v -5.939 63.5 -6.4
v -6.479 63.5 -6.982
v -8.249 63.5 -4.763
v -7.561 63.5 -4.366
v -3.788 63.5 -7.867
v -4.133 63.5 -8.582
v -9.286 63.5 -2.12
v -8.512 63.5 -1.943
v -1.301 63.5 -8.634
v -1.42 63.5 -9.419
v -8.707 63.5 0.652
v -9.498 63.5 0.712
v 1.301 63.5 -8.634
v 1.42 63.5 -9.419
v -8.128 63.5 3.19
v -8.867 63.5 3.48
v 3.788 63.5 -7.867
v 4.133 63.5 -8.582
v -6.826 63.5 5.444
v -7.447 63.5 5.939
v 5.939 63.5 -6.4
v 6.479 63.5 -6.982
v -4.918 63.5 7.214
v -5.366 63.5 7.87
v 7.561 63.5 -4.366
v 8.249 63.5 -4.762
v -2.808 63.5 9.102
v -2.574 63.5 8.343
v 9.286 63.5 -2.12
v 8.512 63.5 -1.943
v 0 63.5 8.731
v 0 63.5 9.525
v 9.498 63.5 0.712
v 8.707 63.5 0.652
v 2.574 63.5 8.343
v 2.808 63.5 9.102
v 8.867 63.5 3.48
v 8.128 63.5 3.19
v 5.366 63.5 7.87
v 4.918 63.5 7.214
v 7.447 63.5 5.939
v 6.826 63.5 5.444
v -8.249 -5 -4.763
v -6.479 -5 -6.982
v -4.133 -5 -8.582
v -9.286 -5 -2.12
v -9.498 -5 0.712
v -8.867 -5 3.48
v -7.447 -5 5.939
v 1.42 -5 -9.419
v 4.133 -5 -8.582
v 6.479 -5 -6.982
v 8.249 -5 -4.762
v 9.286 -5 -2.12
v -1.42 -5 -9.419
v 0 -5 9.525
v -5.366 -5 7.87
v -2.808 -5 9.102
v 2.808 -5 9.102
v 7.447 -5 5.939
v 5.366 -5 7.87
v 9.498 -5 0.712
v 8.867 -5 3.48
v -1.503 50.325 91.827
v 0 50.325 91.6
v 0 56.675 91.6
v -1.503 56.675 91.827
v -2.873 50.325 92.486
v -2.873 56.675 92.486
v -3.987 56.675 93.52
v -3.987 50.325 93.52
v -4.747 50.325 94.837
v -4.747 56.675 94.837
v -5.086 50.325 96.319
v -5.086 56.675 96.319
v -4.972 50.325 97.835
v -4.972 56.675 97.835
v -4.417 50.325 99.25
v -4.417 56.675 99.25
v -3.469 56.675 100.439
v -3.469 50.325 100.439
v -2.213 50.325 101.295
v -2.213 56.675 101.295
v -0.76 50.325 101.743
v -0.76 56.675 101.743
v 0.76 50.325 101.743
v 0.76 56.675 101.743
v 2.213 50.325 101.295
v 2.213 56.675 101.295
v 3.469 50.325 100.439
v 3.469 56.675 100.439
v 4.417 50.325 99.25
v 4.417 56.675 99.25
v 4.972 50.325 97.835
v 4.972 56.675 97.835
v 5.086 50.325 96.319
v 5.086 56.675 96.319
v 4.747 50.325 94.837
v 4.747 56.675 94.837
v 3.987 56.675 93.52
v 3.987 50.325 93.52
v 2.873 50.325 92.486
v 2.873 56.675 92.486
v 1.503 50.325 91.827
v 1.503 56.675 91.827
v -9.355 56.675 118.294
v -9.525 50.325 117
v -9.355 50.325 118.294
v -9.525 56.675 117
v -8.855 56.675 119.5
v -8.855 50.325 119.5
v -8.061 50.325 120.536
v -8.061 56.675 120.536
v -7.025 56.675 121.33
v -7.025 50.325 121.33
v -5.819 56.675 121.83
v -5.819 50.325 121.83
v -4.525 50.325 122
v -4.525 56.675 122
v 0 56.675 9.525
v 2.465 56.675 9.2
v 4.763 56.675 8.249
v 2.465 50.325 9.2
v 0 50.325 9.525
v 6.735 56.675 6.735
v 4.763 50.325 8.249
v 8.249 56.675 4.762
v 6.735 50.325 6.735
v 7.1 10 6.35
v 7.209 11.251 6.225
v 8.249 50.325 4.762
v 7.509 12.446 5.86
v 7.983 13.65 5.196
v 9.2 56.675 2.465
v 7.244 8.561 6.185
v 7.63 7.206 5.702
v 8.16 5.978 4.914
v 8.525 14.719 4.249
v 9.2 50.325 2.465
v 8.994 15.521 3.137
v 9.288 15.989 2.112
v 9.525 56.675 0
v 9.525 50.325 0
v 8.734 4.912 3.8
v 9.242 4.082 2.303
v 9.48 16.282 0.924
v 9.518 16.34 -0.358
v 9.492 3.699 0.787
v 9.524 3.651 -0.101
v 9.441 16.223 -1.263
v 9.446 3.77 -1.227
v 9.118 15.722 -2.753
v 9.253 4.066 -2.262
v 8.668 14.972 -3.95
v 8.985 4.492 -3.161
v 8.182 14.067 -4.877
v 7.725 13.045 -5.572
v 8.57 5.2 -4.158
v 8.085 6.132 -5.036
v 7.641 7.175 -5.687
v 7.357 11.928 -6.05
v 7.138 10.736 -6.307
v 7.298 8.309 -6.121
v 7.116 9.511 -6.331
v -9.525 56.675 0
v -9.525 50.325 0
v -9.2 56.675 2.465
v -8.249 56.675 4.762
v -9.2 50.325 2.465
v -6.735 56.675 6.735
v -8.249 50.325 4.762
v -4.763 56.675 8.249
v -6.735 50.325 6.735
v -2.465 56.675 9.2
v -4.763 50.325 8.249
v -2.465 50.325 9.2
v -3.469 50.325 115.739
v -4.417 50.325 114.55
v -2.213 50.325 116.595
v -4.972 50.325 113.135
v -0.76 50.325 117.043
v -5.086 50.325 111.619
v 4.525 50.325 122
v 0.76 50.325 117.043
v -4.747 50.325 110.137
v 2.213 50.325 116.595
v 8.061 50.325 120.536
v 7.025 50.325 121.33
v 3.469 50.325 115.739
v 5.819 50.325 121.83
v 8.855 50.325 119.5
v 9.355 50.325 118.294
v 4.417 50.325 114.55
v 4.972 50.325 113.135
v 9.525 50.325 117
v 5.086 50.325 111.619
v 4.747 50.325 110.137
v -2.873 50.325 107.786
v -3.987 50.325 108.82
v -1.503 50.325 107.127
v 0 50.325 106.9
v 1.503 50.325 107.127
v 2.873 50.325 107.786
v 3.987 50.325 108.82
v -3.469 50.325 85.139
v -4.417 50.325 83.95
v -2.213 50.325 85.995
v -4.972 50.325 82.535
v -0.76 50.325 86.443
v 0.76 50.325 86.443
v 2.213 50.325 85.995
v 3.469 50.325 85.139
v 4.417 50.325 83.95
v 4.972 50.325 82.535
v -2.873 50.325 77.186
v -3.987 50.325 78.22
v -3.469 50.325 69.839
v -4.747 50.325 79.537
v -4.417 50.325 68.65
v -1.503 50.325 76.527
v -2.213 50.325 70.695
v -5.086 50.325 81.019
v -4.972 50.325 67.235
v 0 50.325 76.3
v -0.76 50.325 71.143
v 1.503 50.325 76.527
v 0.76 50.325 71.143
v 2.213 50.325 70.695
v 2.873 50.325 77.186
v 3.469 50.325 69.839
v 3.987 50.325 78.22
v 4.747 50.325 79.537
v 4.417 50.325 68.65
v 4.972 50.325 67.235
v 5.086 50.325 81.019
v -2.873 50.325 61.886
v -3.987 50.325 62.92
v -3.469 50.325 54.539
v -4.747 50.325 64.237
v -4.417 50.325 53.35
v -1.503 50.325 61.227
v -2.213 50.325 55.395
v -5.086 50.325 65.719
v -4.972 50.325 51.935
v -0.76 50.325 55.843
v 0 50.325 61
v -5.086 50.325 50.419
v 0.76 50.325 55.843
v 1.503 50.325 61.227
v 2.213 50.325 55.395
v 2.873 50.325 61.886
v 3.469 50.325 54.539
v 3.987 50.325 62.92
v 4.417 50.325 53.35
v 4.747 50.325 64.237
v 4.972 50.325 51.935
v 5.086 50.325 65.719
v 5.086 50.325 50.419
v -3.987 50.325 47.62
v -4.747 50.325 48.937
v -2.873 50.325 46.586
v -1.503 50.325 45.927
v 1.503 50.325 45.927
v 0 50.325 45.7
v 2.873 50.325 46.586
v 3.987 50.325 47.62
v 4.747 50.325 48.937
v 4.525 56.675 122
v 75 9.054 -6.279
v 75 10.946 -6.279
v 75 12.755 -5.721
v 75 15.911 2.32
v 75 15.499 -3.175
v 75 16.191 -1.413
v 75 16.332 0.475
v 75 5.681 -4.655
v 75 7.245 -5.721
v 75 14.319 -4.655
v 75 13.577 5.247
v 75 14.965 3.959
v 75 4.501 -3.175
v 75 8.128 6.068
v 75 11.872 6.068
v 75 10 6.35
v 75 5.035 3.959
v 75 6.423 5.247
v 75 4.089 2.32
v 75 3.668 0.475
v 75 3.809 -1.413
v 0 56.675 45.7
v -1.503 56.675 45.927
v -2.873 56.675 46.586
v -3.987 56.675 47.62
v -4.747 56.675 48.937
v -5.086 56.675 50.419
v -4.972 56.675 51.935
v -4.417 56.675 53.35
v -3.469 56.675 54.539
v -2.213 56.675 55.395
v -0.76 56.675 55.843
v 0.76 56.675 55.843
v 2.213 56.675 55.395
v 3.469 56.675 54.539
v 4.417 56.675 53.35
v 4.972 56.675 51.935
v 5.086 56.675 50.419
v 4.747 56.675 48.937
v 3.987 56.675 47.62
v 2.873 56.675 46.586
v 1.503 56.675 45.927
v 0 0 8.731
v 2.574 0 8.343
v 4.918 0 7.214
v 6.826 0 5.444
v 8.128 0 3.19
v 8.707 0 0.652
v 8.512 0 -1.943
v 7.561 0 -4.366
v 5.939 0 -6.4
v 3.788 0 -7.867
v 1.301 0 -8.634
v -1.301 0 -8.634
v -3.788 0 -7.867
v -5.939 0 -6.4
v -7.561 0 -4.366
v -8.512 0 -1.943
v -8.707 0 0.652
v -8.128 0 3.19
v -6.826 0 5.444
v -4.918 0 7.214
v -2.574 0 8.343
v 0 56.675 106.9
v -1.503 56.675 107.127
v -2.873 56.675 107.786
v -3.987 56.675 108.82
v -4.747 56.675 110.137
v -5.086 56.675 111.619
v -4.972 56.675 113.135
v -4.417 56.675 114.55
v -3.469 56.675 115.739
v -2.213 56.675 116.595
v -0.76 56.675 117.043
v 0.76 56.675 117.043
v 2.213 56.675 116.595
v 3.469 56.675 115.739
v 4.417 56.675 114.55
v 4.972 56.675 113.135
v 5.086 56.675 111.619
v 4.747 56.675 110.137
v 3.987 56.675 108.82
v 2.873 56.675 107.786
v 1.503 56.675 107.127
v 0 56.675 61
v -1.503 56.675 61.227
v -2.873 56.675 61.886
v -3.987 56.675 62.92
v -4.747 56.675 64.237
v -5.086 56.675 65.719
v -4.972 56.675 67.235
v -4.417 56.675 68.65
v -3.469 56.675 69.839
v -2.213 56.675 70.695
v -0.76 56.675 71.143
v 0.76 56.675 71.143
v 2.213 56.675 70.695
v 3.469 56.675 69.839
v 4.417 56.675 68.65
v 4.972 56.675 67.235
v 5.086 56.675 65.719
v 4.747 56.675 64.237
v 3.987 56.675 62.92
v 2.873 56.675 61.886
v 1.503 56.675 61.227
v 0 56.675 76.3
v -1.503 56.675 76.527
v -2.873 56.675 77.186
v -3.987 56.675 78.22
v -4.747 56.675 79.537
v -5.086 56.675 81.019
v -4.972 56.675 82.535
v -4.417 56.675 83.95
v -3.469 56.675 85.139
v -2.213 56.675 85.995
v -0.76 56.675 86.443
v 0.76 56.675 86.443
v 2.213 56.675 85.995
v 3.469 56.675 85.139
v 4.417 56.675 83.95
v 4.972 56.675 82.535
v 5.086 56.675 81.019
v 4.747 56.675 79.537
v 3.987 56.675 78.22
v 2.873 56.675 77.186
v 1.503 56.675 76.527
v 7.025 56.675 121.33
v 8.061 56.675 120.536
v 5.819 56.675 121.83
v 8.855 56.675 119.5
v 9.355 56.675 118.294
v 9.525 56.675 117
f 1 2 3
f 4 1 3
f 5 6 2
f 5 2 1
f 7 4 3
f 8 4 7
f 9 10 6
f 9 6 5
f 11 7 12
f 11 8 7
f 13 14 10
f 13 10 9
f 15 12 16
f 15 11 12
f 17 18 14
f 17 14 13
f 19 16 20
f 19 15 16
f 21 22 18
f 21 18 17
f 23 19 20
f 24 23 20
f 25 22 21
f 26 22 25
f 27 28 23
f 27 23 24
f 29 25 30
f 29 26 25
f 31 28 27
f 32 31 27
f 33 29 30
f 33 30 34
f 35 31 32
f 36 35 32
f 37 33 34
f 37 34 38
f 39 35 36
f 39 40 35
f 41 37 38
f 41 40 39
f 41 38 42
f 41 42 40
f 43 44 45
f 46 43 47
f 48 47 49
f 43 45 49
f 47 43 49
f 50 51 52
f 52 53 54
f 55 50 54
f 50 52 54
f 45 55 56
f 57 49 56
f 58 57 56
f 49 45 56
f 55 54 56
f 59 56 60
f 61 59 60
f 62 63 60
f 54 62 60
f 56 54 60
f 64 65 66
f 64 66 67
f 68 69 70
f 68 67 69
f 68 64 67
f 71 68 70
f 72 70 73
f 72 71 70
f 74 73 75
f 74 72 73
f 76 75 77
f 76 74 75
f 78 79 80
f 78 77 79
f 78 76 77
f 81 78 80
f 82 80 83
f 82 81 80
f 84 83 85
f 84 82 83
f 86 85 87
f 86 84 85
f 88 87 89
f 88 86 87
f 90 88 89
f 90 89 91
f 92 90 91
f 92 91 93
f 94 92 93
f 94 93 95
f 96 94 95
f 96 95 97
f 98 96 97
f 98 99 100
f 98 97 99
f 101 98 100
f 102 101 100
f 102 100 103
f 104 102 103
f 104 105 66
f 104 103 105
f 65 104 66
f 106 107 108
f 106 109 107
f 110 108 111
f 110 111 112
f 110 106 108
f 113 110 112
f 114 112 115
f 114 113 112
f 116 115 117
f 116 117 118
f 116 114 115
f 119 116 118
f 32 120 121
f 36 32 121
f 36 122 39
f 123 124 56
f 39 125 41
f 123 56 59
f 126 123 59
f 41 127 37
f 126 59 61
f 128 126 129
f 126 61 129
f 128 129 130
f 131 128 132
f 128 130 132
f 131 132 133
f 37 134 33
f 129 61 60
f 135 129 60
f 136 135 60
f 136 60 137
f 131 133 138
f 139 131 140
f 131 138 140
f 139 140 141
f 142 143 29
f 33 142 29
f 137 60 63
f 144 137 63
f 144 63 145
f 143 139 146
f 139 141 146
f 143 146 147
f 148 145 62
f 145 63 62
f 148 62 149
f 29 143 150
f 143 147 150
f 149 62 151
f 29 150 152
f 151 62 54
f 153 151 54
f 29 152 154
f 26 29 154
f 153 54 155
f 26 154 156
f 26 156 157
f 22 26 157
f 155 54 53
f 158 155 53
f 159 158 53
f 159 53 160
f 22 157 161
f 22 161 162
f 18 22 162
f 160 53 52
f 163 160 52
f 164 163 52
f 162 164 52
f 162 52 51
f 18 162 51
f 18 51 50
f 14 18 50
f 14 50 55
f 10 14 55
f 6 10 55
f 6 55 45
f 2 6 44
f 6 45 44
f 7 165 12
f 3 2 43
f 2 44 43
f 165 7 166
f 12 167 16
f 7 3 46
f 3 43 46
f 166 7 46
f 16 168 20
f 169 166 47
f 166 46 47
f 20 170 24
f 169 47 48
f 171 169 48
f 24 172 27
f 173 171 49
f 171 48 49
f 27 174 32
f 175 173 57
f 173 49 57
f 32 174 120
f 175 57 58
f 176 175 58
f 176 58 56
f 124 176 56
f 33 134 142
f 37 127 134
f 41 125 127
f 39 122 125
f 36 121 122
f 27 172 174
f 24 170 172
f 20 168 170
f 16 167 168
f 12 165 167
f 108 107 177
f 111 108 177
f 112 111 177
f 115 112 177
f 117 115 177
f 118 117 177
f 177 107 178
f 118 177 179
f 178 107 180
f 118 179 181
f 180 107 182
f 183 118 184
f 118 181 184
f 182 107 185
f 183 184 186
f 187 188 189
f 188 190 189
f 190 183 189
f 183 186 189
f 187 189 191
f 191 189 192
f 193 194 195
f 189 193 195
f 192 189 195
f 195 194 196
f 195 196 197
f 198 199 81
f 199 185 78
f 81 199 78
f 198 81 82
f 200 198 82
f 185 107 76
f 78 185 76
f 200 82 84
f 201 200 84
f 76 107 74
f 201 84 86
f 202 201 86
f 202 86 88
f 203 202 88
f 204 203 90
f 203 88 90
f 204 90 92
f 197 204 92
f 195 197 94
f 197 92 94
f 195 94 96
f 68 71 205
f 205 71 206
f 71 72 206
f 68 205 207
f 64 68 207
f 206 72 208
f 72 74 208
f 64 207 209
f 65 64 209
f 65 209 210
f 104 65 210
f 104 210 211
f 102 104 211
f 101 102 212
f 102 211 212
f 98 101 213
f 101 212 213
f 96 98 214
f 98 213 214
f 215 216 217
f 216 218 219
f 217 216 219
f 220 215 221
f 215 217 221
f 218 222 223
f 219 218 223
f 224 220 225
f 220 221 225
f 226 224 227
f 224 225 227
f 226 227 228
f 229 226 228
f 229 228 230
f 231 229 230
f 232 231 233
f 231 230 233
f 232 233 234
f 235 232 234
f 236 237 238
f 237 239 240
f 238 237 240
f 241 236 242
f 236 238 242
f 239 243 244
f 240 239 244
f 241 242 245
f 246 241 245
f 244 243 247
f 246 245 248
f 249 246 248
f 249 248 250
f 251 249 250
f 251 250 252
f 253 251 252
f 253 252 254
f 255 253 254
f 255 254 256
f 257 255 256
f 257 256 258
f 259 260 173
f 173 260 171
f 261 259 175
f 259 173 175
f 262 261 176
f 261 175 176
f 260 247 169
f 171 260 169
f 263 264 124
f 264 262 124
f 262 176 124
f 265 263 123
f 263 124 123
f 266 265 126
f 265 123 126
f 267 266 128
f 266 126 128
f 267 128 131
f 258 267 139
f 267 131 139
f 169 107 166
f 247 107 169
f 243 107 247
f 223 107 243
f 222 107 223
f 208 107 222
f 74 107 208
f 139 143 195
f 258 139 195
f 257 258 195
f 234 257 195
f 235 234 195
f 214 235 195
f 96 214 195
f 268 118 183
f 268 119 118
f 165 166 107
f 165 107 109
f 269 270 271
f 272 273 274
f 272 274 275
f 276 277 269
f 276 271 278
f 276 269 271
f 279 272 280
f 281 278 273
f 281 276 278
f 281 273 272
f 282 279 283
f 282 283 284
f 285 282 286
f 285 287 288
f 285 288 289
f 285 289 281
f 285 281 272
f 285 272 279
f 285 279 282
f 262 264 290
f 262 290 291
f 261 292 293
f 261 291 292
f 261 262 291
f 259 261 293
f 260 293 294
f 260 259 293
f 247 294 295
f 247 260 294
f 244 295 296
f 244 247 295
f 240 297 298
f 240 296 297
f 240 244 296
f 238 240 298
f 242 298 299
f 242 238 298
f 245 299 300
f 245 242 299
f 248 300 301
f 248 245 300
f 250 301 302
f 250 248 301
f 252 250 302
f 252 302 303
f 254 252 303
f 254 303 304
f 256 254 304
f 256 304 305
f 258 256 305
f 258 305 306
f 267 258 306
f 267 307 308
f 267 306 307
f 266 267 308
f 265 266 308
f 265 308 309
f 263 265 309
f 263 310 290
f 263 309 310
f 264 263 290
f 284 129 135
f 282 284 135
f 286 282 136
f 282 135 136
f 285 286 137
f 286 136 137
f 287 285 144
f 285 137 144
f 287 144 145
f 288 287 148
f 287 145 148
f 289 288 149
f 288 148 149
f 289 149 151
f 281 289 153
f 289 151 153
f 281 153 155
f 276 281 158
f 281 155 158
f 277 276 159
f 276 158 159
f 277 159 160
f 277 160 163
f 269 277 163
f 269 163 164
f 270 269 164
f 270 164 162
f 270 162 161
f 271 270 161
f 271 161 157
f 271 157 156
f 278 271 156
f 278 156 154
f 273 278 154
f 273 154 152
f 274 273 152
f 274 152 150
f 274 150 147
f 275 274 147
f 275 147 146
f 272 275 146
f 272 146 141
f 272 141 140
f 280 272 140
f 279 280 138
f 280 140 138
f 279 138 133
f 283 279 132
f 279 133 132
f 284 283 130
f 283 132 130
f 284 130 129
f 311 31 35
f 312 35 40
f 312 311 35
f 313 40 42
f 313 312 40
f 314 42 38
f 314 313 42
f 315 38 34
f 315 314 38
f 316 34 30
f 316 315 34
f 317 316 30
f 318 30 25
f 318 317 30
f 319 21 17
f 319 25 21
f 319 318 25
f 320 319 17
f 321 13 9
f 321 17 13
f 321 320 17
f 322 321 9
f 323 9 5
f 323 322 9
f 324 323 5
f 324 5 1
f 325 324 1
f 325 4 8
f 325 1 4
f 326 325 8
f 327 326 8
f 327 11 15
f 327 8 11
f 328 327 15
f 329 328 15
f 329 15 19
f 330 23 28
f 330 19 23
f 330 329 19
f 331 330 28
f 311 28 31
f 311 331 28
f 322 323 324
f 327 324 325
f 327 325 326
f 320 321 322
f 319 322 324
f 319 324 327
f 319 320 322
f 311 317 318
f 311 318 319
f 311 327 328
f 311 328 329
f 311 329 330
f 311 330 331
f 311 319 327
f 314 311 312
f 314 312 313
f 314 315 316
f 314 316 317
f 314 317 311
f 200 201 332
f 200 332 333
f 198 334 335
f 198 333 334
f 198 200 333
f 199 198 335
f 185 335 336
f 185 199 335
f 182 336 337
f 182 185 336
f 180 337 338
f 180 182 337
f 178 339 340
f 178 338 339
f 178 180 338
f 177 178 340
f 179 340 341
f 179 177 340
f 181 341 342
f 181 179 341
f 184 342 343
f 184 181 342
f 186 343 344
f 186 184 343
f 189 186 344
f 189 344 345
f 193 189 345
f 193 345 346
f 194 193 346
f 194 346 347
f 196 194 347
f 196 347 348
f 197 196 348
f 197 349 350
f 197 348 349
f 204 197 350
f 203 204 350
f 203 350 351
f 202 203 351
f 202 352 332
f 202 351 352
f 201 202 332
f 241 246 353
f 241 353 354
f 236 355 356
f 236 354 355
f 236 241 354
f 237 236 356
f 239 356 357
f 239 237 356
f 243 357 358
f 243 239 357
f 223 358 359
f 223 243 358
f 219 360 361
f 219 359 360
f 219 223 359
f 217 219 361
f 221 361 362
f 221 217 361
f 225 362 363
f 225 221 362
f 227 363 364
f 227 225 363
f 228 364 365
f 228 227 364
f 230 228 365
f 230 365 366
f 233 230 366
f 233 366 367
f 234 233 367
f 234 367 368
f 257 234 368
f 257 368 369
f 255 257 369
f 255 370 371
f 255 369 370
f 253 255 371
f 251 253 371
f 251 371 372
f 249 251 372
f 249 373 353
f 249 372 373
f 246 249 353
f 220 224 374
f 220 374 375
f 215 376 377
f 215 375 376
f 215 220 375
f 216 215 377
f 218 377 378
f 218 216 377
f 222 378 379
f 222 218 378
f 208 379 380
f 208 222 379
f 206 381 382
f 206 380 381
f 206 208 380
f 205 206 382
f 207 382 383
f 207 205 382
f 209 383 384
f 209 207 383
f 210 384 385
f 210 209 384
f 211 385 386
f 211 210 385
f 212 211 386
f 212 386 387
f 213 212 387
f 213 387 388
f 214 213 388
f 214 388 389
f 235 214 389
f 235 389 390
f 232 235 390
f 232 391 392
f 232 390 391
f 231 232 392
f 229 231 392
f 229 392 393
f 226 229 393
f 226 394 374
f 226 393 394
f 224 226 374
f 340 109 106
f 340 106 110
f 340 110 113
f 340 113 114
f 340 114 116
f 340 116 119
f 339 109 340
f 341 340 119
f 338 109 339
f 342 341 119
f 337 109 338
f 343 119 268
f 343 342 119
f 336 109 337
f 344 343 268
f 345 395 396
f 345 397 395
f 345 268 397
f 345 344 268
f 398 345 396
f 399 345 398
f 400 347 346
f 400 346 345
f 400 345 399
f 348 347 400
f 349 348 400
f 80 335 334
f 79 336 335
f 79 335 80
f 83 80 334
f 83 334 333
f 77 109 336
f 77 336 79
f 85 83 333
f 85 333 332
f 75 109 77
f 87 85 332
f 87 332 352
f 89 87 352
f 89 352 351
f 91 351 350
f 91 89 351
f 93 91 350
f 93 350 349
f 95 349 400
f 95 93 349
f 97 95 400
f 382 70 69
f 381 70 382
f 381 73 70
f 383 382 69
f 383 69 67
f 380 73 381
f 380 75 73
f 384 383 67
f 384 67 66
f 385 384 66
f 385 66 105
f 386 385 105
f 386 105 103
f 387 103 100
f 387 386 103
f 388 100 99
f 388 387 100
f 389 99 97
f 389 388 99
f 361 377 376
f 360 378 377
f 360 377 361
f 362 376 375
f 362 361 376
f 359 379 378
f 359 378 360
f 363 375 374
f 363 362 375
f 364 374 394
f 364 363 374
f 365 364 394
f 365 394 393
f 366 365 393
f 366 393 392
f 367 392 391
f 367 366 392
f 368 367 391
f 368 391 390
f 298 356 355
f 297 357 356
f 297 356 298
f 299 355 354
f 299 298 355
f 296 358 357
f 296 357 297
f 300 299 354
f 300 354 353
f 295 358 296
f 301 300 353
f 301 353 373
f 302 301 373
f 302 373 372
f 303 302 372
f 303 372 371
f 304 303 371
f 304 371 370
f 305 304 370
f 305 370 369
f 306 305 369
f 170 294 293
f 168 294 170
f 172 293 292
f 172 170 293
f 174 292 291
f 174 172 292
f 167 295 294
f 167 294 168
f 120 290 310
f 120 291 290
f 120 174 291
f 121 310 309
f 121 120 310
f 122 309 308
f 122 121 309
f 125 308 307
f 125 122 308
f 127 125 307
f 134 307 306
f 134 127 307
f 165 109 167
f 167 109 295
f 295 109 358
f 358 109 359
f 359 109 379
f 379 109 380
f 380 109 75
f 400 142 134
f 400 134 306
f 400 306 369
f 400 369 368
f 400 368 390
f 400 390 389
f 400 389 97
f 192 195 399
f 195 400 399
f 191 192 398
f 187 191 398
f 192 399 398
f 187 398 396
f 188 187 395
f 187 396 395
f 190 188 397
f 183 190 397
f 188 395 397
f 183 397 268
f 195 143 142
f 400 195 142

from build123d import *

# Parameters (mm, degrees)
SLEEVE_DEPTH       = 63.5
SLEEVE_DEPTH_BACK  = 5
SKETCH1_R          = 9.525
SKETCH2_W          = 19.05
SKETCH2_H          = 6.35
BRACKET_DEPTH      = 122
SKETCH4_R          = 5.1
BRACKET_HOLE_DEPTH = 138.86578845
SKETCH5_R          = 6.35
SHAFT_DEPTH        = 75
SKETCH6_R          = 8.73125
SLEEVE_HOLE_DEPTH  = 157.656471388
FILLET1_R          = 5


with BuildPart() as part:
    # Sketch1 → Sleeve (new, two sides: drawn at the far end of the back side and taken through both)
    with BuildSketch(Plane(origin=(0, 0, 0), x_dir=(1, 0, 0), z_dir=(0, 1, 0)).offset(-SLEEVE_DEPTH_BACK)):
        with Locations(Location((0, 0, 0), (0, 0, 270))):
            Circle(SKETCH1_R)
    extrude(amount=SLEEVE_DEPTH + SLEEVE_DEPTH_BACK)

    # Sketch2 → Bracket (add)
    with BuildSketch(Plane.XY):
        with Locations((0, 53.5)):
            Rectangle(SKETCH2_W, SKETCH2_H)
    extrude(amount=BRACKET_DEPTH)

    # Sketch4 → Bracket Hole (cut, through all)
    with BuildSketch(Plane(origin=(0, 0, 0), x_dir=(1, 0, 0), z_dir=(0, 1, 0))):
        with Locations(Location((0, -50.8, 0), (0, 0, 90))):
            Circle(SKETCH4_R)
        with Locations(Location((0, -66.1, 0), (0, 0, 90))):
            Circle(SKETCH4_R)
        with Locations(Location((0, -81.4, 0), (0, 0, 90))):
            Circle(SKETCH4_R)
        with Locations(Location((0, -96.7, 0), (0, 0, 90))):
            Circle(SKETCH4_R)
        with Locations(Location((0, -112, 0), (0, 0, 90))):
            Circle(SKETCH4_R)
    extrude(amount=BRACKET_HOLE_DEPTH, mode=Mode.SUBTRACT)

    # Sketch5 → Shaft (add)
    with BuildSketch(Plane(origin=(0, 0, 0), x_dir=(0, 0, -1), z_dir=(1, 0, 0))):
        with Locations(Location((0, 10, 0), (0, 0, 180))):
            Circle(SKETCH5_R)
    extrude(amount=SHAFT_DEPTH)

    # Sketch6 → Sleeve Hole (cut, through all)
    with BuildSketch(Plane(origin=(0, 0, 0), x_dir=(1, 0, 0), z_dir=(0, 1, 0))):
        with Locations(Location((0, 0, 0), (0, 0, 270))):
            Circle(SKETCH6_R)
    extrude(amount=SLEEVE_HOLE_DEPTH, mode=Mode.SUBTRACT)

    # Fillet1
    fillet1_edges = [part.edges().sort_by_distance(p)[0] for p in [
        (-9.525, 53.5, 122),
        (9.525, 53.5, 122),
    ]]
    fillet(fillet1_edges, radius=FILLET1_R)


solid = part.part
